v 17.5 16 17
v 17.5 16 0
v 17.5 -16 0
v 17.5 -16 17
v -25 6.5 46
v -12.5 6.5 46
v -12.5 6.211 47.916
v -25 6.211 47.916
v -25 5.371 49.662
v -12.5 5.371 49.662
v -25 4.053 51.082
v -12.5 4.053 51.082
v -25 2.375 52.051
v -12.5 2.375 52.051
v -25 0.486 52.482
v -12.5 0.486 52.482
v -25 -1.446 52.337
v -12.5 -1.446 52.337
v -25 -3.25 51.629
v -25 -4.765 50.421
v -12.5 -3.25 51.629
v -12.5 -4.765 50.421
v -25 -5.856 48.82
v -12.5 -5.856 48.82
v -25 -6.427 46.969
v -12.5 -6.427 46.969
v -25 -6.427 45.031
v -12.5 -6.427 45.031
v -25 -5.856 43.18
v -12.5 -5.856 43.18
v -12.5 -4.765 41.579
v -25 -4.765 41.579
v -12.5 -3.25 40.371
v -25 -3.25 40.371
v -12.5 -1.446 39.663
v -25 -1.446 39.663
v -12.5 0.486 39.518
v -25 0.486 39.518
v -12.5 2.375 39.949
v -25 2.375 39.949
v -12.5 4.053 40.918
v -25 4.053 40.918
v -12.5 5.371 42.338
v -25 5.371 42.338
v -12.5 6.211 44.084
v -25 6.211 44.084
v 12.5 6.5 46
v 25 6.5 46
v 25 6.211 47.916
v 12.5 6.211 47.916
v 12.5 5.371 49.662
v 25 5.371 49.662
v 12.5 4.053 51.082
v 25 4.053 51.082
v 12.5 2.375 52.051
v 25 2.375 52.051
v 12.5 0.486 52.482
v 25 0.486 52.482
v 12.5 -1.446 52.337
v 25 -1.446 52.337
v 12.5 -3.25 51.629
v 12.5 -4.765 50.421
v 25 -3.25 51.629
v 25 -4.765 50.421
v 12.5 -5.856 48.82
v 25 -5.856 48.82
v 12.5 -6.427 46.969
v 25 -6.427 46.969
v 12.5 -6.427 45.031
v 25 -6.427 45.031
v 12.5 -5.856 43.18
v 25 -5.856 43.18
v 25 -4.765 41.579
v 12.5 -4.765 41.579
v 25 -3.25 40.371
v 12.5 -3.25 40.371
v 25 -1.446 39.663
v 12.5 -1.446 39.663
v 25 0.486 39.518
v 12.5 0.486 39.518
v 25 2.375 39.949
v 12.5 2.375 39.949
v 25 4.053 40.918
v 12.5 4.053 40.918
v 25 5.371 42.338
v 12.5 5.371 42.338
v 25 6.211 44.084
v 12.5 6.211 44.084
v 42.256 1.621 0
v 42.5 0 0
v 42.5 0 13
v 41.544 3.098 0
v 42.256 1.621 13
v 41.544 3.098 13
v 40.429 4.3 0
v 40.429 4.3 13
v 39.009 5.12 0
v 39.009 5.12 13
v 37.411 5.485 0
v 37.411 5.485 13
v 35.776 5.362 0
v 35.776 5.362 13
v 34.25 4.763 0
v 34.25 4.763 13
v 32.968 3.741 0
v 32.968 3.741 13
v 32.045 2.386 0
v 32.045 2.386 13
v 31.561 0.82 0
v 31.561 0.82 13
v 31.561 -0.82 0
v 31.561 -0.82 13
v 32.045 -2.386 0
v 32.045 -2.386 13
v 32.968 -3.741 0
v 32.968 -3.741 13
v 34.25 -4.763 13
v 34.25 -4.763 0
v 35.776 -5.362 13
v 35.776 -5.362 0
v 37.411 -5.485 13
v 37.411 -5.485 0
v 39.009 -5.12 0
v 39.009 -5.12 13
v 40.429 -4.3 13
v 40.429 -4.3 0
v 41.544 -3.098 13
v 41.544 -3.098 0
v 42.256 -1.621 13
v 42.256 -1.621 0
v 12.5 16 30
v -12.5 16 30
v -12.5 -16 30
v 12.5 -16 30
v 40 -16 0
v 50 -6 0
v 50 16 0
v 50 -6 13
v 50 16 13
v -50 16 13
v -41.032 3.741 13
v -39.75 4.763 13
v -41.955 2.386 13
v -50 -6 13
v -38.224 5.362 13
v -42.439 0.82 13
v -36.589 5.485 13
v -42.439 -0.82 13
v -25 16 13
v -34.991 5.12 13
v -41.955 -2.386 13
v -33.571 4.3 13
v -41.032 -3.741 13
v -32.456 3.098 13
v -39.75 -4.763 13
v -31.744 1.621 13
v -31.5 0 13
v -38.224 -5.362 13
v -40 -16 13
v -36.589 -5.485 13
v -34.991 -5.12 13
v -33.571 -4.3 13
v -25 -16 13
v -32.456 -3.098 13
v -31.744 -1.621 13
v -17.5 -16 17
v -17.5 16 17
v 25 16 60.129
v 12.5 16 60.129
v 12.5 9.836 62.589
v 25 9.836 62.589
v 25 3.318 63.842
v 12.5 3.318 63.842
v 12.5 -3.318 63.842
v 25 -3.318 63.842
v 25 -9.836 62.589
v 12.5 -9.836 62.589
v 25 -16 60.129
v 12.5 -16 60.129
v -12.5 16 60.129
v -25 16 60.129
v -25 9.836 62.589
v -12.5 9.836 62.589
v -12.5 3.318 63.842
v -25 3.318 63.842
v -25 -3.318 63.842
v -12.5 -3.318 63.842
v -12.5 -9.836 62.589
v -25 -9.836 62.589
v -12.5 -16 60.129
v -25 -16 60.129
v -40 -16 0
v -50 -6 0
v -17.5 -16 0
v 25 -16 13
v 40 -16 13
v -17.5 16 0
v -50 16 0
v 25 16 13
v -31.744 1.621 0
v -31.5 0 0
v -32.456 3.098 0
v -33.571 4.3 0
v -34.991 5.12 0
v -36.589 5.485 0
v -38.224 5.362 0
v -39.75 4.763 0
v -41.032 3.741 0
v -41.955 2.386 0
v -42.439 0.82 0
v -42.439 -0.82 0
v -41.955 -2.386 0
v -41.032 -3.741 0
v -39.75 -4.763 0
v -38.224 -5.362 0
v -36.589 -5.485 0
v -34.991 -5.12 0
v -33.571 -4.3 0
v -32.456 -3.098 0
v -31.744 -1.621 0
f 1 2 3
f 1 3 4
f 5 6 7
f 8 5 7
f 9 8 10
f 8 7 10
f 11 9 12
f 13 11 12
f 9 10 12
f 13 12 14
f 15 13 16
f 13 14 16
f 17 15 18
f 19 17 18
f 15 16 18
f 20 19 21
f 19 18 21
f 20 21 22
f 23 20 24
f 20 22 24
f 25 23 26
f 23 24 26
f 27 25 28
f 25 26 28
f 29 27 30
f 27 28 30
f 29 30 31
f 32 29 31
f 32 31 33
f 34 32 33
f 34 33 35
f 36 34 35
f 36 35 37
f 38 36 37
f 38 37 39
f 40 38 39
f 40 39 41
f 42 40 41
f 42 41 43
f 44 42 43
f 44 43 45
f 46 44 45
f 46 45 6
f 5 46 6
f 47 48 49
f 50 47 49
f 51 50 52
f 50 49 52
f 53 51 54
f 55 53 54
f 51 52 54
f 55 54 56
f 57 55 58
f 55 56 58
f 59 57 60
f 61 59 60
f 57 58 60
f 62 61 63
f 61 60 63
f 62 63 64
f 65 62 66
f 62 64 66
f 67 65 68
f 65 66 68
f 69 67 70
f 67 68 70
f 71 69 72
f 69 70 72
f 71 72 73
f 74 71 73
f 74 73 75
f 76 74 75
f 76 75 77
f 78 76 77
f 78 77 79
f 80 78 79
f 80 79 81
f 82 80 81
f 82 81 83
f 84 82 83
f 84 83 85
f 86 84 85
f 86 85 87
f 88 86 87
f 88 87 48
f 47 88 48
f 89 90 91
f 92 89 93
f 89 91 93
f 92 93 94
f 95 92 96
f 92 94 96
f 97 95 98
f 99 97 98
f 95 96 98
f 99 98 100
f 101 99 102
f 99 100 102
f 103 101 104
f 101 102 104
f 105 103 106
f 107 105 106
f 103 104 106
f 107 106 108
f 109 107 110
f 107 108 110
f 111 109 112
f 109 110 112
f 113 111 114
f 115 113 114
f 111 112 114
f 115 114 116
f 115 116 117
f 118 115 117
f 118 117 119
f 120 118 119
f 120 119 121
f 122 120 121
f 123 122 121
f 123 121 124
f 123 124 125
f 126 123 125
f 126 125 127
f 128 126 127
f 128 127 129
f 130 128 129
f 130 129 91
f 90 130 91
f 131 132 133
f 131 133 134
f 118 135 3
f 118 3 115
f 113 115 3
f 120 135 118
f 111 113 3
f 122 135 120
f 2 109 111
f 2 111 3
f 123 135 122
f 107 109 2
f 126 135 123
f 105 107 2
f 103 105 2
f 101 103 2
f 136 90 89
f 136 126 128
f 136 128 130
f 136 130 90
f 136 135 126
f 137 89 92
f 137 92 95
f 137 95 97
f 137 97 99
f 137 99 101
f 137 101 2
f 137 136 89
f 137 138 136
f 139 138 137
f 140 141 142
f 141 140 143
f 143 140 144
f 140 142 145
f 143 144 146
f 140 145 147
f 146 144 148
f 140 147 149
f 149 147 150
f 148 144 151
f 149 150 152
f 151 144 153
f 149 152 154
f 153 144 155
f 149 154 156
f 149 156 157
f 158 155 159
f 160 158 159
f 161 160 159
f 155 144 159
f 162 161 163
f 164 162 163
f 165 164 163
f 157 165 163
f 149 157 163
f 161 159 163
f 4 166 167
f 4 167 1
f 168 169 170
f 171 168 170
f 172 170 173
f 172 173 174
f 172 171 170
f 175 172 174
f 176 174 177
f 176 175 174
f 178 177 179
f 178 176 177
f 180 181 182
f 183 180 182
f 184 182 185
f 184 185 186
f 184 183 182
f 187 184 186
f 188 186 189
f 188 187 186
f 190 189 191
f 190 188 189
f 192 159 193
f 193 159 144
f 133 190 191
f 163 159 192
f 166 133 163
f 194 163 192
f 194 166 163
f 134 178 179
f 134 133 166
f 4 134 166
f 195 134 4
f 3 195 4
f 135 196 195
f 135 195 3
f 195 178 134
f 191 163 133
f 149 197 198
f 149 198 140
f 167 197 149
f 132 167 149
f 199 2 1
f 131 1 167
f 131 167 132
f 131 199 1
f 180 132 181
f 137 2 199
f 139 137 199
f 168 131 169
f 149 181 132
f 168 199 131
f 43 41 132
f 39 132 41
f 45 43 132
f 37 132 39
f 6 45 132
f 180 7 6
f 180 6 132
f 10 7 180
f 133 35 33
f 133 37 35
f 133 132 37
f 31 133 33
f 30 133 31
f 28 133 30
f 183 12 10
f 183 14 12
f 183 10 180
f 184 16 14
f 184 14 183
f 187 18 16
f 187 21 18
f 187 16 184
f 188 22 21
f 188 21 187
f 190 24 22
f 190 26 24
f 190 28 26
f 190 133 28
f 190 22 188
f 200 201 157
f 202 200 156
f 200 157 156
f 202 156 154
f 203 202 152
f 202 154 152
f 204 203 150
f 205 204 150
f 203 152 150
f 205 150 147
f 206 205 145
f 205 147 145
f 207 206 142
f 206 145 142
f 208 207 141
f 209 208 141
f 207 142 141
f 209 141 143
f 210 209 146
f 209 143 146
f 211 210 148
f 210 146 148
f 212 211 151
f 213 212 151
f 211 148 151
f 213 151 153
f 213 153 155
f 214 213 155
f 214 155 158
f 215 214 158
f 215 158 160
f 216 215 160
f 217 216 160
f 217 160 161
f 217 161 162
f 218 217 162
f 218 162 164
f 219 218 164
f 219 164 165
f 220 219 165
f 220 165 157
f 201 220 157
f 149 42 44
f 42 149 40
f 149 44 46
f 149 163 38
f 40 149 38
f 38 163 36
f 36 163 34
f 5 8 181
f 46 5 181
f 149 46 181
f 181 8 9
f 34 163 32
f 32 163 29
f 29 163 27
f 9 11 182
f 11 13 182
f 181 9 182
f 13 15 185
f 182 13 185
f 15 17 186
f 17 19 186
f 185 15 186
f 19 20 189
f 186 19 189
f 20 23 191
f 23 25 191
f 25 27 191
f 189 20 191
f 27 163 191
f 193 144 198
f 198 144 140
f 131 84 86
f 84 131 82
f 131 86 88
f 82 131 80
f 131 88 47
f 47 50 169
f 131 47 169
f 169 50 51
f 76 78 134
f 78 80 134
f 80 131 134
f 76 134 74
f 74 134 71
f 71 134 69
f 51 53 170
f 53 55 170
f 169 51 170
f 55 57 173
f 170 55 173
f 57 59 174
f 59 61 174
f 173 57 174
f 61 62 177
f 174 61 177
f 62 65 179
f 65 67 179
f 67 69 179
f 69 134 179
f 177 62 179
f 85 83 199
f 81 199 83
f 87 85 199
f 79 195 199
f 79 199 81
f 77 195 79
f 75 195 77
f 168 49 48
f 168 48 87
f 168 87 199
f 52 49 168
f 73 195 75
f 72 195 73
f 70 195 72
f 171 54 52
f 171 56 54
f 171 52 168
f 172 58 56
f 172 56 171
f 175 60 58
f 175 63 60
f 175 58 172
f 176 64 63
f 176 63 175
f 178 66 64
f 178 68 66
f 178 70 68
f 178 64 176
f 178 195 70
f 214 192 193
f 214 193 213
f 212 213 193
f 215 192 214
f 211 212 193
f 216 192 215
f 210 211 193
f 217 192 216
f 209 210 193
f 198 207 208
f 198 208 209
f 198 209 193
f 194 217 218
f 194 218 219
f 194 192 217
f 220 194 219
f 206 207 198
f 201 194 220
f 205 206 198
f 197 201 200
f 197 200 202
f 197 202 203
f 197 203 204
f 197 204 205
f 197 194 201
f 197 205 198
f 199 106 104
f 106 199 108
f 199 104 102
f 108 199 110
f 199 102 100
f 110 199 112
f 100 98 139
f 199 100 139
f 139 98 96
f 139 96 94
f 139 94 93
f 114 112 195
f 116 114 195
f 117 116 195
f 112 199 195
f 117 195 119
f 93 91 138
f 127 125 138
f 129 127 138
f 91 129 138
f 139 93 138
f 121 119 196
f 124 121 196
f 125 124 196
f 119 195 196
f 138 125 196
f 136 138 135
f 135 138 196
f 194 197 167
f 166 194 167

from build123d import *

# Parameters (mm, degrees)
F1_DEPTH = 50
F2_W     = 35
F2_H     = 17
F2_W_2   = 25
F2_H_2   = 40.236561
F2_H_3   = 60.406679
F3_DEPTH = 32.001
F4_R     = 5.5
F5_DEPTH = 13.001
F6_R     = 5.5
F7_DEPTH = 13.001
F8_R     = 6.5
F9_DEPTH = 75.001


with BuildPart() as f1:
    # F0 (on Right) → F1 (new body, symmetric)
    with BuildSketch(Plane.YZ):
        with BuildLine():
            Line((-16, 60.128765), (-16, 0))
            Line((-16, 0), (16, 0))
            Line((16, 0), (16, 60.128765))
            ThreePointArc((16, 60.128765), (0, 64), (-16, 60.128765))
        make_face()
    extrude(amount=F1_DEPTH, both=True)

    # F2 (on face) → F3 (cut, through all)
    with BuildSketch(Plane.XZ.offset(16)):
        with Locations((0, 8.5)):
            Rectangle(F2_W, F2_H)
        with Locations((0, 50.11828)):
            Rectangle(F2_W_2, F2_H_2)
        with Locations((-37.5, 43.203339)):
            Rectangle(F2_W_2, F2_H_3)
        with Locations((37.5, 43.203339)):
            Rectangle(F2_W_2, F2_H_3)
    extrude(amount=-F3_DEPTH, mode=Mode.SUBTRACT)

    # F4 (on face) → F5 (cut, through all)
    with BuildSketch(Plane.XY.offset(13)):
        Polygon((-40, -16), (-50, -6), (-50, -16), align=None)
        with Locations((-37, 0)):
            Circle(F4_R)
    extrude(amount=-F5_DEPTH, mode=Mode.SUBTRACT)

    # F6 (on face) → F7 (cut, through all)
    with BuildSketch(Plane.XY.offset(13)):
        Polygon((50, -6), (40, -16), (50, -16), align=None)
        with Locations((37, 0)):
            Circle(F6_R)
    extrude(amount=-F7_DEPTH, mode=Mode.SUBTRACT)

    # F8 (on face) → F9 (cut, through all)
    with BuildSketch(Plane.YZ.offset(25)):
        with Locations((0, 46)):
            Circle(F8_R)
    extrude(amount=-F9_DEPTH, mode=Mode.SUBTRACT)


solid = f1.part
